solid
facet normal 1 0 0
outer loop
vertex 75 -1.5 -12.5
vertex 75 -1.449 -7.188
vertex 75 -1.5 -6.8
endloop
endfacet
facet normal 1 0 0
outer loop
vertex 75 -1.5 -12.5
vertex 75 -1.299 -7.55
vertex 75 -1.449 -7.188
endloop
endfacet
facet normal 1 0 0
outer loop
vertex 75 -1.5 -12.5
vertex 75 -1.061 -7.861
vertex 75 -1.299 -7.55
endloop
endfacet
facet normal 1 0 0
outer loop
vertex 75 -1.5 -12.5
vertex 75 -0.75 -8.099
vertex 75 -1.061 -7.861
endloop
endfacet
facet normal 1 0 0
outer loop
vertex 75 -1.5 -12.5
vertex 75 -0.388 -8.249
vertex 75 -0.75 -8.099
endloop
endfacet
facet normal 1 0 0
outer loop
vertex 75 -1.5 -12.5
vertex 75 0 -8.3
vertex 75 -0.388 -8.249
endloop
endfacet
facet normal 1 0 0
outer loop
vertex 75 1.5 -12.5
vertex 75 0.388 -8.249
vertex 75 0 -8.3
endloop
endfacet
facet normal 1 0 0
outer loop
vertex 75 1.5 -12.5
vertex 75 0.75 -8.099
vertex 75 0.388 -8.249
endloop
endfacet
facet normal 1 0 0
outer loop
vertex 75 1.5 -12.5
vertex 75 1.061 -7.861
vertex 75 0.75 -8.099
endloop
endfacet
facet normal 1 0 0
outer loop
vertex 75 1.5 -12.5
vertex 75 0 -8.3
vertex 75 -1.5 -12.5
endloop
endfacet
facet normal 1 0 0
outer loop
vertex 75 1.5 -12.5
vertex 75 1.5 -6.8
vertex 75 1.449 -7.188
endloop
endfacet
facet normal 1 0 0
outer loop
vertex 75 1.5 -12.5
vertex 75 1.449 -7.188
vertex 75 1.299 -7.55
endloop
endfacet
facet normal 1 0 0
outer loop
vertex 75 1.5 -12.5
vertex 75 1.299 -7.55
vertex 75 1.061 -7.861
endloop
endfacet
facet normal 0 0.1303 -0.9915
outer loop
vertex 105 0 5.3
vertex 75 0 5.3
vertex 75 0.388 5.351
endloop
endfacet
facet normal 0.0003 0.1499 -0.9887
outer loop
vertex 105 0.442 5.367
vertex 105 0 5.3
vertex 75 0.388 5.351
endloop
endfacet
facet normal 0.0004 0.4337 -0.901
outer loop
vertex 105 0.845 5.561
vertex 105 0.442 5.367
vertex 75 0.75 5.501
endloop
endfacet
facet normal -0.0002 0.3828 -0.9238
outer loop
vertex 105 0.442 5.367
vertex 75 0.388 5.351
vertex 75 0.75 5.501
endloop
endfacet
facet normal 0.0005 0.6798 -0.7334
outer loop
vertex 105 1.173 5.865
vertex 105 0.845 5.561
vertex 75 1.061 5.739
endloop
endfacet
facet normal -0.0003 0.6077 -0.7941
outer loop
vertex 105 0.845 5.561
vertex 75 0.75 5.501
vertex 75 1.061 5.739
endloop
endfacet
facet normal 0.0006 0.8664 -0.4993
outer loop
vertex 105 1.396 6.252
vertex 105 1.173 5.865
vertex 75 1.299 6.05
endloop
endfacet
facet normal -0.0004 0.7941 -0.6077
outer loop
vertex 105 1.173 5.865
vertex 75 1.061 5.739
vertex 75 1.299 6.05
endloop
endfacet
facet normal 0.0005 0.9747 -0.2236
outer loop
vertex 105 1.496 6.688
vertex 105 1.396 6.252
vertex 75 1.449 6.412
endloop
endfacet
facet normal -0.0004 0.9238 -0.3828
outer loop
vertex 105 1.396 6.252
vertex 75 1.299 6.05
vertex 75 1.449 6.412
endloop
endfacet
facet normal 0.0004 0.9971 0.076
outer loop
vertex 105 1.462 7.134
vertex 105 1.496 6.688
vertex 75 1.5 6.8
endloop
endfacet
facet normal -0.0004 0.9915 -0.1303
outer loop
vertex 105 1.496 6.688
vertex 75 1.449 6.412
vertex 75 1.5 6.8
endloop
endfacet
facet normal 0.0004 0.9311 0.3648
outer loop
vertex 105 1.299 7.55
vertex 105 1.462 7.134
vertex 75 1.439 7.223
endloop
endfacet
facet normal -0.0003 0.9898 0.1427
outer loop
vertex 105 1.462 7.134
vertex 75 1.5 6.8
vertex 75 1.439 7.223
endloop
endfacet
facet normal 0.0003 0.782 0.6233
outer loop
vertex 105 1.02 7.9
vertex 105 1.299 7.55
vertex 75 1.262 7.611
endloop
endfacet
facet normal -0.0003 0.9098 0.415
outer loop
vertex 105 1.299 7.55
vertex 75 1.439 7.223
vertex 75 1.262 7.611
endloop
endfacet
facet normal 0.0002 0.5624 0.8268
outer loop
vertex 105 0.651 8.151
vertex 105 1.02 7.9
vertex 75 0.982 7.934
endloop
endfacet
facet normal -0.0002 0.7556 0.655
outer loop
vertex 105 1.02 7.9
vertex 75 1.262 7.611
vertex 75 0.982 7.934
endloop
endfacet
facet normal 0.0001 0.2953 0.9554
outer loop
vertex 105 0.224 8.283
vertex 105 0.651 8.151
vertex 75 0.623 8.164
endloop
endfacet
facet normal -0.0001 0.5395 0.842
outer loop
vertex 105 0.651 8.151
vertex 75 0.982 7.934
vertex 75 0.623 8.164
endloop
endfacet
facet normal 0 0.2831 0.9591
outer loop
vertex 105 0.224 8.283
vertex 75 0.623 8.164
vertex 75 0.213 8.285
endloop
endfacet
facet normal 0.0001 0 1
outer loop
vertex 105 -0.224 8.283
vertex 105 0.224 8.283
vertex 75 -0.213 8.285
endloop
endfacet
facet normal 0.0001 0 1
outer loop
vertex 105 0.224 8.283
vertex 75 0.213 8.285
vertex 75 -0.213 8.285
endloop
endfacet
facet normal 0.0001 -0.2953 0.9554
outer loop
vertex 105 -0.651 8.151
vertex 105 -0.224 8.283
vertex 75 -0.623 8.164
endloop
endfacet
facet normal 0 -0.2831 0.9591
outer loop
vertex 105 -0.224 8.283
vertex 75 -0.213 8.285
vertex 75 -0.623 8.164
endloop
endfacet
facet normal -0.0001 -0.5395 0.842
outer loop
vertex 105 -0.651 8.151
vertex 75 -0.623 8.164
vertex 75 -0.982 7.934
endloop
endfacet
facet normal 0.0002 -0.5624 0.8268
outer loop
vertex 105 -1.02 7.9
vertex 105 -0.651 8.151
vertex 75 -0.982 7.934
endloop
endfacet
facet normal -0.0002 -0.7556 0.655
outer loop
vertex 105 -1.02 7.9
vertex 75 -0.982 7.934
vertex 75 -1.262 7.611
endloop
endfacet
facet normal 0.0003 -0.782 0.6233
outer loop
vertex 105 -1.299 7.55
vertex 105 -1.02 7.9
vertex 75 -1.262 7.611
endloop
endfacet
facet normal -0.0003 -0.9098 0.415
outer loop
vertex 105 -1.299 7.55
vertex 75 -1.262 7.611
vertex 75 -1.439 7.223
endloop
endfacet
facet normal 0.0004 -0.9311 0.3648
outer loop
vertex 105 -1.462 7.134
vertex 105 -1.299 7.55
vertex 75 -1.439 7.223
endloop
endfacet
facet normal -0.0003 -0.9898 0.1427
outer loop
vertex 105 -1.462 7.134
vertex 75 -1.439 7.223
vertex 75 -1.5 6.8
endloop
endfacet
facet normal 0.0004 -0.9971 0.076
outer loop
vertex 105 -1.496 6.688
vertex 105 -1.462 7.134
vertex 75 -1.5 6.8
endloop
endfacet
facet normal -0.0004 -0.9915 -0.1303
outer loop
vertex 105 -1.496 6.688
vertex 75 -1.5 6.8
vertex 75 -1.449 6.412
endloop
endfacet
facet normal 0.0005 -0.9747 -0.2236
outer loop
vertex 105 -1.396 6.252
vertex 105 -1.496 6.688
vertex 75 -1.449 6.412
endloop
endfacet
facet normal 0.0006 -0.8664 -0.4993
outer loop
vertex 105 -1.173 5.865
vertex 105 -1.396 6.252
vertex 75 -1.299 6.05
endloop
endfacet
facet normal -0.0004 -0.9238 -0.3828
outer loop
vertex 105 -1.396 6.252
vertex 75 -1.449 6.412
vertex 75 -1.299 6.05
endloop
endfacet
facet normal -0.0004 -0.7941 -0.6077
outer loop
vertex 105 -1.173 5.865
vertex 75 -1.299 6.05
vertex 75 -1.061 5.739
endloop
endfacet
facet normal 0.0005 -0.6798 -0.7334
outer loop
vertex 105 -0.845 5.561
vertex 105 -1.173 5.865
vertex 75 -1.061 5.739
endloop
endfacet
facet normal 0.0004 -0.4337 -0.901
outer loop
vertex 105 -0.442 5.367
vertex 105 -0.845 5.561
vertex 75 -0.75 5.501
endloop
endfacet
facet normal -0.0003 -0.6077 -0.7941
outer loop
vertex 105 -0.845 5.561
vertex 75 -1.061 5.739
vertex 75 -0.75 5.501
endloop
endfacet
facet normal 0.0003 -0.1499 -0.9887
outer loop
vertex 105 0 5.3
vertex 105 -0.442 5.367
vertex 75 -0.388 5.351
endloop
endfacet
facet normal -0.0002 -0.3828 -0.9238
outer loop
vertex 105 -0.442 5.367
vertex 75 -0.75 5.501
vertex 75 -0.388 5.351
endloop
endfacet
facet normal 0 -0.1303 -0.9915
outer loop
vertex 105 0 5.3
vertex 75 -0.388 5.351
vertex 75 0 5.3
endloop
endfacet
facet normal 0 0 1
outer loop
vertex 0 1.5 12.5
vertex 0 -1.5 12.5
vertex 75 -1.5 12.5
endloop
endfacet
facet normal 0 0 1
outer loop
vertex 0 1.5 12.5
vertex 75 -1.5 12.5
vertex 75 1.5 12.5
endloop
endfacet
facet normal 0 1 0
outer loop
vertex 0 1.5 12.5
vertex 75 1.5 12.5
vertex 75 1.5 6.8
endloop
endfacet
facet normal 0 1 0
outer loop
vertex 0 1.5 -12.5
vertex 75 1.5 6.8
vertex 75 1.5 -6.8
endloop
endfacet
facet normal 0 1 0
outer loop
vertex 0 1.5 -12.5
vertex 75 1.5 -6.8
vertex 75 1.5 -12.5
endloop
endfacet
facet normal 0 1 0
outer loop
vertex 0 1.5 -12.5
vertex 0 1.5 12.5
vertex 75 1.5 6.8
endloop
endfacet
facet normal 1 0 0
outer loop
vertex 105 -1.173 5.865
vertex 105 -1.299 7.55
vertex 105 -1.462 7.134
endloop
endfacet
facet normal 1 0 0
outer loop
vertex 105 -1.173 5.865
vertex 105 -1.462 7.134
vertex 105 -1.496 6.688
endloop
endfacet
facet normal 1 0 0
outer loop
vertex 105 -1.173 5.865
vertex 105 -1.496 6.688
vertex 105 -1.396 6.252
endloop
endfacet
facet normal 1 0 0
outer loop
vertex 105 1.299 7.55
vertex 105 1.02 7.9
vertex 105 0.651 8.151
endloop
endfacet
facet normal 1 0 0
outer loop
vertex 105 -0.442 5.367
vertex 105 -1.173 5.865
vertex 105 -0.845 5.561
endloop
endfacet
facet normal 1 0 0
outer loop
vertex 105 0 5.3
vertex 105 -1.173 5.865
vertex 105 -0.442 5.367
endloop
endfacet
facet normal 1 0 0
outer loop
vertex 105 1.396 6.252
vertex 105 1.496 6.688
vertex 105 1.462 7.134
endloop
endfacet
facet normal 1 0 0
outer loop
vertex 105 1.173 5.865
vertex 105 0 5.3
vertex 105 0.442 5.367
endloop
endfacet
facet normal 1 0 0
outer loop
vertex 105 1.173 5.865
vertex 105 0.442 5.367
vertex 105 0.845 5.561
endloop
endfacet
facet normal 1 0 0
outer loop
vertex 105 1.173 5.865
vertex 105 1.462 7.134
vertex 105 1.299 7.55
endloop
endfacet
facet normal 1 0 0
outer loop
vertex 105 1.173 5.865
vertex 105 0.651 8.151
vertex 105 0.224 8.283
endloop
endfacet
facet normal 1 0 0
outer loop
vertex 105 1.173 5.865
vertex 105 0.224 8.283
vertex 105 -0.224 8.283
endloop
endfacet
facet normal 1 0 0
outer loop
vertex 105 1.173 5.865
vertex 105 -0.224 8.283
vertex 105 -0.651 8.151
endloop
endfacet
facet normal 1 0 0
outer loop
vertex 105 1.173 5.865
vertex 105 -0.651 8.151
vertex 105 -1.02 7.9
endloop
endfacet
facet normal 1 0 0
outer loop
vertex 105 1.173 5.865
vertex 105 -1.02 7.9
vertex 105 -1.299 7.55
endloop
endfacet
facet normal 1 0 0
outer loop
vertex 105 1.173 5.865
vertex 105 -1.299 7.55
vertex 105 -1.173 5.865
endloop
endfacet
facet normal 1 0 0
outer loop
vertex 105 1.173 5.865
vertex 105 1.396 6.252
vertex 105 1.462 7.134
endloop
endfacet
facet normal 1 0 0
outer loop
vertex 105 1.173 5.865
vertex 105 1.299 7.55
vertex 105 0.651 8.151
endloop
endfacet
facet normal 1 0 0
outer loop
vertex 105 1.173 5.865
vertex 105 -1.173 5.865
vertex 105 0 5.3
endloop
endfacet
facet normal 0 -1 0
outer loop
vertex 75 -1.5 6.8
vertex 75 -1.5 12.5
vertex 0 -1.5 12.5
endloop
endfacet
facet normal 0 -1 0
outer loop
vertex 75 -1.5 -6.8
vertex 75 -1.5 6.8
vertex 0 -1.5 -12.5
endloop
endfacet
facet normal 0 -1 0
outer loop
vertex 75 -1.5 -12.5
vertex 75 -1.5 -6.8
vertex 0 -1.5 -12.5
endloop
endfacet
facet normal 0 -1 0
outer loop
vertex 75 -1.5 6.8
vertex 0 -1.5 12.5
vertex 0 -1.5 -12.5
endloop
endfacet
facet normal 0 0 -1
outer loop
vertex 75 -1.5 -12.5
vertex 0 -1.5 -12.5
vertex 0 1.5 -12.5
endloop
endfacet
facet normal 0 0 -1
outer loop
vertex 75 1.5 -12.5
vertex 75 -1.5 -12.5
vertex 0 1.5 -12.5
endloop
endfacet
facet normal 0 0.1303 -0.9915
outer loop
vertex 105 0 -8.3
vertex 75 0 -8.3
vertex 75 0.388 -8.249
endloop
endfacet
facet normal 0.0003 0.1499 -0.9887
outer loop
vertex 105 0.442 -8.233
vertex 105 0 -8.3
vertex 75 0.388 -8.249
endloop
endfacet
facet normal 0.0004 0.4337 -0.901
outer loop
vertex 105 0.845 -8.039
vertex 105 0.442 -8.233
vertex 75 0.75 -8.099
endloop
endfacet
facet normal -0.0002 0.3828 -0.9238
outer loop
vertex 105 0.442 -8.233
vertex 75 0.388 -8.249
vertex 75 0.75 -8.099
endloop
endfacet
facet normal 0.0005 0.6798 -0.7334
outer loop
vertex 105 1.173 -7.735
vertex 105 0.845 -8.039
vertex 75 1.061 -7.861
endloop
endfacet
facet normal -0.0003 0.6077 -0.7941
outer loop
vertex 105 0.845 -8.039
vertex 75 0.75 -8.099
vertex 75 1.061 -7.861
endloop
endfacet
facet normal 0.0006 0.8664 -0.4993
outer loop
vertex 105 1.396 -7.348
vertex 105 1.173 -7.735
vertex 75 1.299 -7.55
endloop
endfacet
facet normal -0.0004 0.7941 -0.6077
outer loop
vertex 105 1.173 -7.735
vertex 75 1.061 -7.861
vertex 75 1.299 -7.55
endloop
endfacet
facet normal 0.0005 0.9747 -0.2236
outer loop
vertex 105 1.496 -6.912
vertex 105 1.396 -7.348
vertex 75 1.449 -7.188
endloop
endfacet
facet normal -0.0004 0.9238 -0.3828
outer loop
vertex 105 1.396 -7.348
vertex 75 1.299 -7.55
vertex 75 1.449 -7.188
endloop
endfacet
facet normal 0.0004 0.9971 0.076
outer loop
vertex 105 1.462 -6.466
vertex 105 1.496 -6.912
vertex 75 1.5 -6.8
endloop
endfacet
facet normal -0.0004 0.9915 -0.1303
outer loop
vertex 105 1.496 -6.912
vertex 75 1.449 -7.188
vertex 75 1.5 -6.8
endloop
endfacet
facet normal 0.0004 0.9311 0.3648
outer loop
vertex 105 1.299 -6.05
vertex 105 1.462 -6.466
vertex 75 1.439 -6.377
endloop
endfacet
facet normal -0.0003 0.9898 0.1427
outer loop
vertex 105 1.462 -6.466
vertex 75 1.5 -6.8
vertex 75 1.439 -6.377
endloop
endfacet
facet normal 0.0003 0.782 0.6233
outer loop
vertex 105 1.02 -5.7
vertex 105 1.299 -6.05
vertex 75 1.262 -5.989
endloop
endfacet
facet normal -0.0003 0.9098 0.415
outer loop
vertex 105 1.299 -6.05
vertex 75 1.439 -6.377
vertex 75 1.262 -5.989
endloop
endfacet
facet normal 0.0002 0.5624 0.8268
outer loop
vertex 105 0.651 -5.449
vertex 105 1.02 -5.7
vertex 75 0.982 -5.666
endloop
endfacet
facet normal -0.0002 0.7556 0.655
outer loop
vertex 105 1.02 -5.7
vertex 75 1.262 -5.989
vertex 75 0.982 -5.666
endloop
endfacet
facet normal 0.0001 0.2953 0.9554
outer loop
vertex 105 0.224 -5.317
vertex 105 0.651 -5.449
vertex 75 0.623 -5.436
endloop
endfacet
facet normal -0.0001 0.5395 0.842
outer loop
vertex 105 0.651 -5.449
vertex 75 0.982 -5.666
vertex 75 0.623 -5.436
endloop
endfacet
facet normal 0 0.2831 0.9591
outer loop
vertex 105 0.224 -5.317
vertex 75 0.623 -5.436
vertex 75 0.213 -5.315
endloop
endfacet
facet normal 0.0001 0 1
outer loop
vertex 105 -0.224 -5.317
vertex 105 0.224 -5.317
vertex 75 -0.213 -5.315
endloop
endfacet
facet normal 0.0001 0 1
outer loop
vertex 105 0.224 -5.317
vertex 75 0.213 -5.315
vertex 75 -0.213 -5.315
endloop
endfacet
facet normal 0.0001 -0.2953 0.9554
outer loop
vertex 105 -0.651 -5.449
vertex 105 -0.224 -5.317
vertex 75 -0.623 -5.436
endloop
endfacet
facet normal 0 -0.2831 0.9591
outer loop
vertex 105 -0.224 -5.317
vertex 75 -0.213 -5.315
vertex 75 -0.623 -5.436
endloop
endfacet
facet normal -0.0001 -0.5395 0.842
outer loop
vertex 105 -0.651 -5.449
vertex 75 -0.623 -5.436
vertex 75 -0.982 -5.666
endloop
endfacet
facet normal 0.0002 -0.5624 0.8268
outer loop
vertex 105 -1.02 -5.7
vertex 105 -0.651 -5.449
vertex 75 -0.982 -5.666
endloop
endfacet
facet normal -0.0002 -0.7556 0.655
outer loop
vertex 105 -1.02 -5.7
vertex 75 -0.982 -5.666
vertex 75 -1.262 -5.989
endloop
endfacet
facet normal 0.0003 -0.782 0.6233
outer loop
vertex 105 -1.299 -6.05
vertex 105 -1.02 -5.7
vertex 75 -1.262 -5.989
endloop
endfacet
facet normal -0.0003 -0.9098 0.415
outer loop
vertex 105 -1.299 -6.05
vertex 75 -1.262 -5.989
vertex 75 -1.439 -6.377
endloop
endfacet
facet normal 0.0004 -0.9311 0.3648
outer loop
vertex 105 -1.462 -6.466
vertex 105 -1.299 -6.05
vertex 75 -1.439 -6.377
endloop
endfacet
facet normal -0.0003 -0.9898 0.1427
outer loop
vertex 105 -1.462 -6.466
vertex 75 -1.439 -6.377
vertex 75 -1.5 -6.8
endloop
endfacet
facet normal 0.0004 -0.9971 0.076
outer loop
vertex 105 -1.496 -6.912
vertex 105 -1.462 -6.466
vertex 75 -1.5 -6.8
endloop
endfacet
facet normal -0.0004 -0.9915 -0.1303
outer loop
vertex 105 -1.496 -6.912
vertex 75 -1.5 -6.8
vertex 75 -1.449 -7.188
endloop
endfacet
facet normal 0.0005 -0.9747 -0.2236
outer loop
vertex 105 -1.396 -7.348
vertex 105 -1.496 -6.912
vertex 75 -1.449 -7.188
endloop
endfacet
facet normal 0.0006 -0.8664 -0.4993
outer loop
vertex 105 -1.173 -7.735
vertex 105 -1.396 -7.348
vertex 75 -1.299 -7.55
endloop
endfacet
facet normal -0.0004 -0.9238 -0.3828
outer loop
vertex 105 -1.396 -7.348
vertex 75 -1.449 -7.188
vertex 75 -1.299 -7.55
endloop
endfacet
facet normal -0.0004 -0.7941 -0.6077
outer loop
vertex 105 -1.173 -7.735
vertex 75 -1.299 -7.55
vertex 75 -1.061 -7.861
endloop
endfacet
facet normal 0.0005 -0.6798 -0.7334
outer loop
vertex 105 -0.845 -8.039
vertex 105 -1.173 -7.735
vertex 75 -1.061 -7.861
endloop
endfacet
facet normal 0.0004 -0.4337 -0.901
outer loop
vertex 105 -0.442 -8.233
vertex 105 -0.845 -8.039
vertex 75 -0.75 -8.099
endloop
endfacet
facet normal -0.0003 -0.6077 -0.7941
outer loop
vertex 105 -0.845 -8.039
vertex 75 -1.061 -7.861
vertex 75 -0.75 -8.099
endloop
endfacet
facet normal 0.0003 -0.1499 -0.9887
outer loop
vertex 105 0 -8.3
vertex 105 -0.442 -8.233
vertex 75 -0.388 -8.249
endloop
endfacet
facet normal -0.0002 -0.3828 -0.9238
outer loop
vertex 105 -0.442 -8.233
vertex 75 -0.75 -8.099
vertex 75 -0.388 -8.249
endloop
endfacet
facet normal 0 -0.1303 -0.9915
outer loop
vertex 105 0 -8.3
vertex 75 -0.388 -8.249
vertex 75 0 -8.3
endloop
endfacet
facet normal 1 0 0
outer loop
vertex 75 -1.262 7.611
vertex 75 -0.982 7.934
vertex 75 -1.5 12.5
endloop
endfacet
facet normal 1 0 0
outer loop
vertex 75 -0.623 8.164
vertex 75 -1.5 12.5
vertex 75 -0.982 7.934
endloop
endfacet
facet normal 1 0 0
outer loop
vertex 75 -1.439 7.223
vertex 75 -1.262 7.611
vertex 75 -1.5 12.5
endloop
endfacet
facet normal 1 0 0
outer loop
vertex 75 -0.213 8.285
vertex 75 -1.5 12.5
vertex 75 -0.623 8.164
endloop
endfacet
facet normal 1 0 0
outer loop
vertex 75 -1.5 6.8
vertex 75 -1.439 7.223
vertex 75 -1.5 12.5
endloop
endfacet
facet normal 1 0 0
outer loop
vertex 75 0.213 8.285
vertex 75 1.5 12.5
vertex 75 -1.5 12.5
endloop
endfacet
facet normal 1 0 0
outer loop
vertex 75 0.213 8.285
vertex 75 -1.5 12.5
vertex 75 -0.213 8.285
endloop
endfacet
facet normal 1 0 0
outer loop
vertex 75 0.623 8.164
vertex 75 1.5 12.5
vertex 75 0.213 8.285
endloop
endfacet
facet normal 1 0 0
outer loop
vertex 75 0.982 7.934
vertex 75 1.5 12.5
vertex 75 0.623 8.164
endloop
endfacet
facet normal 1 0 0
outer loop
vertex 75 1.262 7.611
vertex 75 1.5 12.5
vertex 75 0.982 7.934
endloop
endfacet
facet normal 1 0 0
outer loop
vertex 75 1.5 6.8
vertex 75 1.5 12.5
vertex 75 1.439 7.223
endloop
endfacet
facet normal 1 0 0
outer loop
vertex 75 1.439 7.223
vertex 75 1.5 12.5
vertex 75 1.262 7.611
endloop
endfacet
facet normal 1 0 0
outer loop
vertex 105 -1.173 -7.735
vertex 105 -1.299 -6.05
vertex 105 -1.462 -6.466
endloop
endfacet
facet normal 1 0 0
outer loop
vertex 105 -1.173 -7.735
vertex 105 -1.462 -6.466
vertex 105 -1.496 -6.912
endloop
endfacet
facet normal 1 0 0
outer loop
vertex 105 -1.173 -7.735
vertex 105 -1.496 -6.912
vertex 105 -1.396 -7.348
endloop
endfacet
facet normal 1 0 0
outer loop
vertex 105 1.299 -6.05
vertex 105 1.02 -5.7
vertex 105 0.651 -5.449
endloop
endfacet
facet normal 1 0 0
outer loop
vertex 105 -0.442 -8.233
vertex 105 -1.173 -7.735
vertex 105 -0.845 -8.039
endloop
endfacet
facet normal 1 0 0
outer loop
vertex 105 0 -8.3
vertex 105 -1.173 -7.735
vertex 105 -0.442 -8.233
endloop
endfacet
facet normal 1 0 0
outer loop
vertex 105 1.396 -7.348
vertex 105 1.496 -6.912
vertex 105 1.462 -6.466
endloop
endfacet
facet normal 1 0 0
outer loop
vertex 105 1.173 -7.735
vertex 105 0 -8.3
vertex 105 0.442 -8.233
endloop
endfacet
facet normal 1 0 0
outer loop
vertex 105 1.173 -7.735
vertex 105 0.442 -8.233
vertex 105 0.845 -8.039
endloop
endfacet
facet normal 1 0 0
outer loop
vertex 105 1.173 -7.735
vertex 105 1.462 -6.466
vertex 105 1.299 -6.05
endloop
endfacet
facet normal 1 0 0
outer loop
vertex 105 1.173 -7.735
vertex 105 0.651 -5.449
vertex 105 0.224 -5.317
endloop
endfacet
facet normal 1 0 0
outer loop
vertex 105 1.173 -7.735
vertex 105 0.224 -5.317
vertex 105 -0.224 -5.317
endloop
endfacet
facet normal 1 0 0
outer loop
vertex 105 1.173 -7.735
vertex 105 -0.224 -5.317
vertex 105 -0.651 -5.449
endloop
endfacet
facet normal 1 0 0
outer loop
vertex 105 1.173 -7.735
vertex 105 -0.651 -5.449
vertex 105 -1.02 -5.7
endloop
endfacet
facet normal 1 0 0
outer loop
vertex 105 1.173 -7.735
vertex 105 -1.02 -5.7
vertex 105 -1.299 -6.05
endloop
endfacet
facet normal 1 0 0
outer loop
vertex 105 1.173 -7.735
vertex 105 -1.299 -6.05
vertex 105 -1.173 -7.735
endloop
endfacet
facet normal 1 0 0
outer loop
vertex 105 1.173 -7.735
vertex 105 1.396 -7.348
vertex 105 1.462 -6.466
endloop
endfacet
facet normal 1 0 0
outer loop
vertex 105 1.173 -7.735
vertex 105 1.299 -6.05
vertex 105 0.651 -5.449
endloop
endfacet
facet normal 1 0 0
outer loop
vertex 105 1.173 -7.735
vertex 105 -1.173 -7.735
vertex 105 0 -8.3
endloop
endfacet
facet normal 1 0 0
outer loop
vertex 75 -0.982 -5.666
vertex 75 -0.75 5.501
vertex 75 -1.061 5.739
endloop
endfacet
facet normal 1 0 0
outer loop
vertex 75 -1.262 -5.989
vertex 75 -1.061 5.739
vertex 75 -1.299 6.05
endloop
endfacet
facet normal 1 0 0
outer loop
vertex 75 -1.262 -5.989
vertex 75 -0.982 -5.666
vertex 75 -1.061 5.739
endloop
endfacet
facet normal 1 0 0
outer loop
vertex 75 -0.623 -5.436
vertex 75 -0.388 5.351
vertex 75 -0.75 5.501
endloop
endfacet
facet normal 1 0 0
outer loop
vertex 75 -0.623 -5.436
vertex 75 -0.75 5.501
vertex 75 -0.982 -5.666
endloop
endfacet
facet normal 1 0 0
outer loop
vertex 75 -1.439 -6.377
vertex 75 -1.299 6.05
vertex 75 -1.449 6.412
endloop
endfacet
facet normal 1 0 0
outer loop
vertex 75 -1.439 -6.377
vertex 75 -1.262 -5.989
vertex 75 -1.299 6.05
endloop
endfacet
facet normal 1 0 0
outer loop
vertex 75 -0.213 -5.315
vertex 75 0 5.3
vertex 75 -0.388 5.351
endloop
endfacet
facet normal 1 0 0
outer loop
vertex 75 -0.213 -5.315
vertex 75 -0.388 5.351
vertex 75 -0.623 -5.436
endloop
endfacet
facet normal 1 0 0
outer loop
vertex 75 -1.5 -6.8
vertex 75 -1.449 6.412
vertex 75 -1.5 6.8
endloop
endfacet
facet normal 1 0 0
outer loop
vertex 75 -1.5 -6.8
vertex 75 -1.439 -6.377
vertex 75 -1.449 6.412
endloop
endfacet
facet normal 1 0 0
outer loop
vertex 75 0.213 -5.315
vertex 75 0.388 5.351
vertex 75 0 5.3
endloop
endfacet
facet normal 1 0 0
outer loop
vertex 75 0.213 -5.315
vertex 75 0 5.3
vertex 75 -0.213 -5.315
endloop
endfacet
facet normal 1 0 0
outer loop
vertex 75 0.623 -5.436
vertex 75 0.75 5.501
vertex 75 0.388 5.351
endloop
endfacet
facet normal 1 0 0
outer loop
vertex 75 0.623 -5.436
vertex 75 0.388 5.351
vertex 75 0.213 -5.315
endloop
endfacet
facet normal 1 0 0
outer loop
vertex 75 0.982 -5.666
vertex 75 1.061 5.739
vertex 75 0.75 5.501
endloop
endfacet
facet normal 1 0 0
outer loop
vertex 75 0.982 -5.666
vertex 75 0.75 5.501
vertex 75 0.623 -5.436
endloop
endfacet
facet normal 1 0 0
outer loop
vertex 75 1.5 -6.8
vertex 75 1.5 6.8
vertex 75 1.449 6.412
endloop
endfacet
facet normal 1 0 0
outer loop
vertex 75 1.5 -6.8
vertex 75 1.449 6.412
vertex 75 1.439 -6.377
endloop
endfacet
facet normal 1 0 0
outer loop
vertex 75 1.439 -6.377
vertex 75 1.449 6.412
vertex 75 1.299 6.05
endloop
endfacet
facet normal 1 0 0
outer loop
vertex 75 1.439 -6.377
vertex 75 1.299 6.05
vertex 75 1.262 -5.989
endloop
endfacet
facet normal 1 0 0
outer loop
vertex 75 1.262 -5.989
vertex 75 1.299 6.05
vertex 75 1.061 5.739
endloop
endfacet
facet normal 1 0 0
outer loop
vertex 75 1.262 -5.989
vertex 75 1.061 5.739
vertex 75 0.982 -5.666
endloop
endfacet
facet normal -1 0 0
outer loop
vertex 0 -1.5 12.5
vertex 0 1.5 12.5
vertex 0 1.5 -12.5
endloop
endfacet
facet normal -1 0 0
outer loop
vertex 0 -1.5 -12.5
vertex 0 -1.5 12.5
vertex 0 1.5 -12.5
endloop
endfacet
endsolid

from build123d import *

# Parameters (mm, degrees)
SKETCH1_W           = 25
SKETCH1_H           = 3
BOSS_EXTRUDE1_DEPTH = 75
SKETCH2_R           = 1.5
BOSS_EXTRUDE2_DEPTH = 30


with BuildPart() as part:
    # Sketch1 → Boss-Extrude1 (new body)
    with BuildSketch(Plane(origin=(0, 0, 0), x_dir=(0, 0, -1), z_dir=(1, 0, 0))):
        Rectangle(SKETCH1_W, SKETCH1_H)
    extrude(amount=BOSS_EXTRUDE1_DEPTH)

    # Sketch2 → Boss-Extrude2 (add)
    with BuildSketch(Plane(origin=(75, 0, 0), x_dir=(0, 0, -1), z_dir=(1, 0, 0))):
        with Locations((-6.8, 0)):
            Circle(SKETCH2_R)
        with Locations((6.8, 0)):
            Circle(SKETCH2_R)
    extrude(amount=BOSS_EXTRUDE2_DEPTH)


solid = part.part
